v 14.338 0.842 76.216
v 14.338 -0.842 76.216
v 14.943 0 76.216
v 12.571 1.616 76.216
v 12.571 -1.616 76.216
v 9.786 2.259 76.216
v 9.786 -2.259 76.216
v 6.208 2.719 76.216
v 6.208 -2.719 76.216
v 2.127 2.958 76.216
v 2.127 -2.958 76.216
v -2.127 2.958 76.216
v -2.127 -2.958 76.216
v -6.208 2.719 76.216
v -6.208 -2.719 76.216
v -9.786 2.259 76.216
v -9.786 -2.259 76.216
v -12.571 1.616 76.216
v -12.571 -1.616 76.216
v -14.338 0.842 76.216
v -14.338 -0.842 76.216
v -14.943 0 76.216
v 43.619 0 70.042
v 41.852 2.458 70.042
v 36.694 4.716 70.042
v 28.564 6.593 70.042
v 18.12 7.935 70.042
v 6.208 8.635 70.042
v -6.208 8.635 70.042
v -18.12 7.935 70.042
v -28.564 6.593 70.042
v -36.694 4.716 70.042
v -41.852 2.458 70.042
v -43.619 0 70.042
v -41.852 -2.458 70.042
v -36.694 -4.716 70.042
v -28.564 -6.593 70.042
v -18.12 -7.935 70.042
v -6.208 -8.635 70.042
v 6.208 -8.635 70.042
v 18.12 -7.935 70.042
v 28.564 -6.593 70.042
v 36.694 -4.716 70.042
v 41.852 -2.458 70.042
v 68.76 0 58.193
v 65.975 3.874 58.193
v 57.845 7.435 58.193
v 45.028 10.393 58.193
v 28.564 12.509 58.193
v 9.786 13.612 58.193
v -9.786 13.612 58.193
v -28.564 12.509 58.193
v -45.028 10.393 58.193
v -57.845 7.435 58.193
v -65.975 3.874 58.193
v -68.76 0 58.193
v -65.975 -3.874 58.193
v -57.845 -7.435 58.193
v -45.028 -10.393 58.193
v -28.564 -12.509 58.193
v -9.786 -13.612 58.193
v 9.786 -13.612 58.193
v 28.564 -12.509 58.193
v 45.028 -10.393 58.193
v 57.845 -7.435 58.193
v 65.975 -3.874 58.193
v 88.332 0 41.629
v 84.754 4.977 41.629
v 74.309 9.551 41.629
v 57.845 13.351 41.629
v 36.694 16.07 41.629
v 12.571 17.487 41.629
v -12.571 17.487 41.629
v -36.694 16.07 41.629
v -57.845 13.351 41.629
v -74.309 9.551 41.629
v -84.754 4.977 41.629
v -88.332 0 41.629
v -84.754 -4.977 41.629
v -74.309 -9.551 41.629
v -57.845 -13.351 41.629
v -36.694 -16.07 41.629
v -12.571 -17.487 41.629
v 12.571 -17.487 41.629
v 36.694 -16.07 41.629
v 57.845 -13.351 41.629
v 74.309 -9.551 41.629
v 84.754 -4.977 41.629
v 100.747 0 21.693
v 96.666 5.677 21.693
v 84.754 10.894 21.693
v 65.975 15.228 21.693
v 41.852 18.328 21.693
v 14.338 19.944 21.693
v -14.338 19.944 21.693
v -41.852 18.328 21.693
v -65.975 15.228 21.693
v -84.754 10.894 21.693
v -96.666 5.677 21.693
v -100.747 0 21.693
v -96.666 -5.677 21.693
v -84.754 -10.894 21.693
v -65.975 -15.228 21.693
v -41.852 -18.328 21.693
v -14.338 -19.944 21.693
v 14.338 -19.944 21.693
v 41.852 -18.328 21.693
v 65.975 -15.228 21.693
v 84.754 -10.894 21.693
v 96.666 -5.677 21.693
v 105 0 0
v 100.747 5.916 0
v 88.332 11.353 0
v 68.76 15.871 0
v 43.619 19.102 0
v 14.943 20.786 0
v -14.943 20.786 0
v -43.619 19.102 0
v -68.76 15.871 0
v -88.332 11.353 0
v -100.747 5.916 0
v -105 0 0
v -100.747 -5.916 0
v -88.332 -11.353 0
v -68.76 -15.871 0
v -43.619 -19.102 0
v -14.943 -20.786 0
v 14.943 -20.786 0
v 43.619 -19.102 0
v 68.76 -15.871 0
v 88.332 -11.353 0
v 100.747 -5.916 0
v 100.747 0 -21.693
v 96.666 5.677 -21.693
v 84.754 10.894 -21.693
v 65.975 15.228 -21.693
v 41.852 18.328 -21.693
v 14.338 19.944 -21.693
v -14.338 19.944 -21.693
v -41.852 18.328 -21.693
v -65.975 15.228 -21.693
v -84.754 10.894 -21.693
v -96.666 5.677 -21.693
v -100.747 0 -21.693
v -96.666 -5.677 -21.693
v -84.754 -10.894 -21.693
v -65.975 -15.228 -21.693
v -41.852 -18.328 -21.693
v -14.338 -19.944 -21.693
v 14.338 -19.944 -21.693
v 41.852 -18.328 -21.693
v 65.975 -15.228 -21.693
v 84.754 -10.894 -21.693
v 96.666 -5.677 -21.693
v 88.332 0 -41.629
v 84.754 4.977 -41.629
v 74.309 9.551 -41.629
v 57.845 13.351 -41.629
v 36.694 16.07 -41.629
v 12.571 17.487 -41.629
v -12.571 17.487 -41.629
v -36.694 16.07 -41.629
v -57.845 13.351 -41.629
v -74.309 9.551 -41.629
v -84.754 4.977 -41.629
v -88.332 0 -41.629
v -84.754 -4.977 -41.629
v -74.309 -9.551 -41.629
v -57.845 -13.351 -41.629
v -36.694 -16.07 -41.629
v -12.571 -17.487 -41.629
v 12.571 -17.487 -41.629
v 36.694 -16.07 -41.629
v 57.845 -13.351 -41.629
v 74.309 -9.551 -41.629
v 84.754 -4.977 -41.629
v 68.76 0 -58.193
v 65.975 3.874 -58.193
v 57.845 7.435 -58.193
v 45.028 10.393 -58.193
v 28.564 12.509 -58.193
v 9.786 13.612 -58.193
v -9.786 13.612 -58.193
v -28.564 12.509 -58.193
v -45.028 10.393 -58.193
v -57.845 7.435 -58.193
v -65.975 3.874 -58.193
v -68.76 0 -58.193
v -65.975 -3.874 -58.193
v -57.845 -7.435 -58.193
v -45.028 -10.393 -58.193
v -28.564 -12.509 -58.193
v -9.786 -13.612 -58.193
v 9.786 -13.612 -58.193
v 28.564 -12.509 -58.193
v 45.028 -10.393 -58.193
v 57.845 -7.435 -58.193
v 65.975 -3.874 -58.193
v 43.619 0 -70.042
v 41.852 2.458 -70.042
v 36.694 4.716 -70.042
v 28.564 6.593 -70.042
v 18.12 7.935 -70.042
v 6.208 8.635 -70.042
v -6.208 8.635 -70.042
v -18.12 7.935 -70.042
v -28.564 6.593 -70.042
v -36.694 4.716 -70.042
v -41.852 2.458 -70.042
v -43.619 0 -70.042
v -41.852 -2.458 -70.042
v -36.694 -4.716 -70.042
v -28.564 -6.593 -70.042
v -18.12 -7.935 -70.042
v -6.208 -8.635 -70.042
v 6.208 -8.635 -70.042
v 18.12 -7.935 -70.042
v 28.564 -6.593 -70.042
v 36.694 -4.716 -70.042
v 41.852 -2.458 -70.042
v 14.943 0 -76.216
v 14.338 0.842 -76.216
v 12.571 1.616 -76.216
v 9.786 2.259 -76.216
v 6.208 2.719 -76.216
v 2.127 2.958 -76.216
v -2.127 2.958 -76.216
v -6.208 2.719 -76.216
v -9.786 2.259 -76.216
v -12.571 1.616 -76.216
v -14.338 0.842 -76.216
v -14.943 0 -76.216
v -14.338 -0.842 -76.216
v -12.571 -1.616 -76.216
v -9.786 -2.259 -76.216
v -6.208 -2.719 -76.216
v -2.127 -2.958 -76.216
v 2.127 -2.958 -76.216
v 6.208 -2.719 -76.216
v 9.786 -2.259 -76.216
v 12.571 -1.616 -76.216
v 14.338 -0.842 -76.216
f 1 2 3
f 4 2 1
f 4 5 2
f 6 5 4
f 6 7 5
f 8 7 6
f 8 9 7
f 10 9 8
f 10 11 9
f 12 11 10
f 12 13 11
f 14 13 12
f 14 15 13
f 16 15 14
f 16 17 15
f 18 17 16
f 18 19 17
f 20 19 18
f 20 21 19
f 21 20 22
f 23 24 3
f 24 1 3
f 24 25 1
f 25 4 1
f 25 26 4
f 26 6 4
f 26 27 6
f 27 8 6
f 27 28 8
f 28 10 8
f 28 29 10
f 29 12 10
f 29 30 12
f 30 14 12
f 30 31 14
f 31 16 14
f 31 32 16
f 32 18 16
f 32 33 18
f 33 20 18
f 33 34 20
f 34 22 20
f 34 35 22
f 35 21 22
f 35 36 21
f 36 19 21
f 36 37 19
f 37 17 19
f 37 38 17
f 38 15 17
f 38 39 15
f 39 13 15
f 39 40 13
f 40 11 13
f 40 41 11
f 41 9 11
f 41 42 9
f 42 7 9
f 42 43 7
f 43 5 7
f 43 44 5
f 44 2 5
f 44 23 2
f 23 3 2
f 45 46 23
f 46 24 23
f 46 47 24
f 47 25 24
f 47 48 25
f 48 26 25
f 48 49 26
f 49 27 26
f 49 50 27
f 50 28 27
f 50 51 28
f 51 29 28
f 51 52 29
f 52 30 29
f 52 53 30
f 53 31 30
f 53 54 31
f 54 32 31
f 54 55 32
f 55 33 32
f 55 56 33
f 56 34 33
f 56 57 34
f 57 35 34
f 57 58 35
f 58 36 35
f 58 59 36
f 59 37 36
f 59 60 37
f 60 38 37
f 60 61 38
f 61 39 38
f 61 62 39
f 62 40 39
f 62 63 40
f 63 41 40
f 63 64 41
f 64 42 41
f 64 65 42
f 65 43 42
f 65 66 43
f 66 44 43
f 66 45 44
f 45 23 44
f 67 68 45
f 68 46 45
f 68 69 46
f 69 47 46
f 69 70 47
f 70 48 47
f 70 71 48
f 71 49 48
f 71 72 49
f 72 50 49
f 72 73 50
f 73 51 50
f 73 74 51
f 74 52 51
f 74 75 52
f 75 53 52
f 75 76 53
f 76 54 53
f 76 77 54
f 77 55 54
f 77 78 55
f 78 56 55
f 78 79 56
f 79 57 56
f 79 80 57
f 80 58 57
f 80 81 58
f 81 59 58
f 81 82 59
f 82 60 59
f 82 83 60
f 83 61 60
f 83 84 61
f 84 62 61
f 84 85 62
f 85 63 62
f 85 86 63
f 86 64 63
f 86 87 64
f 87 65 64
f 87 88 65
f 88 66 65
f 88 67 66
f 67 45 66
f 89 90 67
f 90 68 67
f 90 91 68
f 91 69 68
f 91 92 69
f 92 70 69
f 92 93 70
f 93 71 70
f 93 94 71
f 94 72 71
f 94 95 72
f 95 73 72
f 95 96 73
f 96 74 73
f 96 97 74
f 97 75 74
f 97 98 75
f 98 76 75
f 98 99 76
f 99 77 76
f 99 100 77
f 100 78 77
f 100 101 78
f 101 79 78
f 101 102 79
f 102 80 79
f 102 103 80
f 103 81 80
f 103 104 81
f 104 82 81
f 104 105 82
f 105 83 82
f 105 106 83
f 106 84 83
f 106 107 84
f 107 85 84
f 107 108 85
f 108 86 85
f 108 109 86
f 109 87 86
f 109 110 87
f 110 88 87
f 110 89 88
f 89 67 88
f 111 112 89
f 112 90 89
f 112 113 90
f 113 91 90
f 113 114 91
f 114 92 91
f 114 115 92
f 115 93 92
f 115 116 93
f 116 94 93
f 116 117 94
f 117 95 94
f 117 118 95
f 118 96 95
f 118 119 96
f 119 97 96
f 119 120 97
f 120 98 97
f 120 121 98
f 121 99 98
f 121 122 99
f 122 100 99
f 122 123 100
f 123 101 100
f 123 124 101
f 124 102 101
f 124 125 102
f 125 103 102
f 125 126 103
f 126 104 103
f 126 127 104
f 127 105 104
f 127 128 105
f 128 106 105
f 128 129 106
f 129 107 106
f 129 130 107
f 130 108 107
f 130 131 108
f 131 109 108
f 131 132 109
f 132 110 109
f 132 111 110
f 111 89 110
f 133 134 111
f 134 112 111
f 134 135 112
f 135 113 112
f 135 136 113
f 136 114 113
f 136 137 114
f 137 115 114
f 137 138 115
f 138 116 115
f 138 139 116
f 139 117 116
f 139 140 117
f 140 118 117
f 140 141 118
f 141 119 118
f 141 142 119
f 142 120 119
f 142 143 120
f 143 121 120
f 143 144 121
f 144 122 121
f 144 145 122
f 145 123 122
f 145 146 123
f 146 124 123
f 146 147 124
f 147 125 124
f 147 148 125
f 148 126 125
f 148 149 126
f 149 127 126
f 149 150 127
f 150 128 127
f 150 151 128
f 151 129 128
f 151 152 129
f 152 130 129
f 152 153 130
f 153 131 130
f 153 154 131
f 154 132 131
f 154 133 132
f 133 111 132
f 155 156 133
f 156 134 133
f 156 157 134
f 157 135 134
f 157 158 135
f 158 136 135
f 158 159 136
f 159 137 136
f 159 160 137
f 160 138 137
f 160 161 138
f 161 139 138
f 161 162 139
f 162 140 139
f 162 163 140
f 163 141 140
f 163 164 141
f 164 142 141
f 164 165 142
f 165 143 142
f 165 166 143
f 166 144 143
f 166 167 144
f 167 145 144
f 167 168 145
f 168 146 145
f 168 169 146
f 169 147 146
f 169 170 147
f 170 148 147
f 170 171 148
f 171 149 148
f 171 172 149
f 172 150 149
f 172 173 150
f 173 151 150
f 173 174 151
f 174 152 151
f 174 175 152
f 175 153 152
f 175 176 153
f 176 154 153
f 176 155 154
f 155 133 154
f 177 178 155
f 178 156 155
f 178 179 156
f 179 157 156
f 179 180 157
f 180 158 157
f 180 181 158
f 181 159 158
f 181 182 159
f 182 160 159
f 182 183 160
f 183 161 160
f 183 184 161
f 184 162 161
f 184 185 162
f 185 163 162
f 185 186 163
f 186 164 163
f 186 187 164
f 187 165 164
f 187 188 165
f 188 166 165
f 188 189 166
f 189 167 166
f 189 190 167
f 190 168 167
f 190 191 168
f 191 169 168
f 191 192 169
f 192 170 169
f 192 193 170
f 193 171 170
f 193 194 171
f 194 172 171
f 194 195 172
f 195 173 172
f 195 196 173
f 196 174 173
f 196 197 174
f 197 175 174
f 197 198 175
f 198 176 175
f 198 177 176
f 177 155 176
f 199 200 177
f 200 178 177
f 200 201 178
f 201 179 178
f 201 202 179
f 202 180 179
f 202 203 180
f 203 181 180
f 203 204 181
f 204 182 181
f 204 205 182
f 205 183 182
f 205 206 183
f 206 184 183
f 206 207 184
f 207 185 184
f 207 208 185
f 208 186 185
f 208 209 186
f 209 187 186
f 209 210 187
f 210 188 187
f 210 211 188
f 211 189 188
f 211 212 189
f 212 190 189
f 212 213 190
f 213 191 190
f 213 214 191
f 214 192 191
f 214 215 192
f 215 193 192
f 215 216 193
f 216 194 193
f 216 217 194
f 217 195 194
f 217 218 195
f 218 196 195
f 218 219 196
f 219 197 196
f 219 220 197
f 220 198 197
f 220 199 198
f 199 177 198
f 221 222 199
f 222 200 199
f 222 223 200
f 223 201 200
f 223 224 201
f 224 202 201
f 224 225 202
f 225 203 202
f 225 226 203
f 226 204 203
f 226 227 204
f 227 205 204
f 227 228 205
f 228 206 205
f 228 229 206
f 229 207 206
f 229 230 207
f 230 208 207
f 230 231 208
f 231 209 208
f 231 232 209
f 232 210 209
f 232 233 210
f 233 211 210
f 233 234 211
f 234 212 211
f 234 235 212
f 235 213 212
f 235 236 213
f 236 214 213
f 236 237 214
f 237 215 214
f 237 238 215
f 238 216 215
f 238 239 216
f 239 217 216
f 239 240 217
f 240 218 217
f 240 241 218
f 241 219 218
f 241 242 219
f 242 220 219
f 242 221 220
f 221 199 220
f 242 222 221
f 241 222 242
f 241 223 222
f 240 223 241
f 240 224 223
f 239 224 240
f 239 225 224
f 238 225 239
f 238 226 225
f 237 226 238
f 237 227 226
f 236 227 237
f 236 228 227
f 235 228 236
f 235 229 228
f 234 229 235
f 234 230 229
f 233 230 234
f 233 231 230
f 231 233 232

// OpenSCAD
// Generated by SolidPython 1.0.1 on 2020-07-29 00:46:51


scale(v = [15, 3, 11]) {
	sphere(r = 7);
}
/***********************************************
*********      SolidPython code:      **********
************************************************
 
# import packages: SolidPython
from solid import *
from solid.utils import *
from itertools import chain, combinations, permutations


class Resize:

    def __init__(self, scad_file):
        self.scad_file = scad_file
        #self.scad_file = import_scad(scad_file)
        # cone/cylinder param:
        self.r1 = 0
        self.r2 = 0
        self.h = 0
        # rectangular prism param:
        self.w = 0
        self.l = 0
        # ellipse param:
        self.r = 0

    # import OpenScad code (file name corresponds to shape)


    # classify shape + parameters
    def assign(self, param1, param2, param3):
        if self.scad_file == 'cone.scad':
            self.r1 = param1
            self.r2 = param2
            self.h = param3
        elif self.scad_file == 'cylinder.scad':
            self.r1 = param1
            self.r2 = param2
            self.h = param3
        elif self.scad_file == 'rectangularPrism.scad':
            self.h = param1
            self.l = param2
            self.w = param3
        else:
            self.r = param1
            self.h = param2

    # resize parameters
    def iterate(self):
        x = range(3, 20, 2)
        i = 1
        if self.scad_file == 'cone.scad':
            tempList = list(permutations(x, 2))
            for temp in tempList:
                param1 = temp[0]
                param2 = temp[1]
                filepath = 'produced_scad_files/' + 'cone' + str(param1) + '_' + str(param2) + '_' + '.scad'
                scad_render_to_file(cylinder(h=param1, r1=param2, r2=0), filepath)

        elif self.scad_file == 'cylinder.scad':
            tempList = list(permutations(x, 3))
            for temp in tempList:
                param1 = temp[0]
                param2 = temp[1]
                filepath = 'produced_scad_files/' + 'cylinder' + str(param1) + '_' + str(param2) + '_' + '.scad'
                scad_render_to_file(cylinder(h=param1, r1=param2, r2=param2), filepath)

        elif self.scad_file == 'rectangularPrism.scad':
            tempList = list(permutations(x, 3))
            for temp in tempList:
                param1 = temp[0]
                param2 = temp[1]
                param3 = temp[2]
                filepath = 'produced_scad_files/' + 'rectangularPrism' + str(param1) + '_' + str(param2) + '_' + str(
                    param3) + '.scad'
                scad_render_to_file(cube(size=(param1, param2, param3)), filepath)

        elif self.scad_file == 'ellipse.scad':
            tempList = list(permutations(x, 4))
            for temp in tempList:
                param1 = temp[0]
                param2 = temp[1]
                param3 = temp[2]
                param4 = temp[3]
                filepath = 'produced_scad_files/' + 'ellipse' + str(param1) + '_' + str(param2) + '_' + str(param3) + '_' + str(param4) + '.scad'
                scad_render_to_file(scale([param1, param2, param3])(sphere(r=param4)), filepath)

    def render_to_scadfile(self):
        scad_render_to_file(scad, 'example.scad') 
 
************************************************/
